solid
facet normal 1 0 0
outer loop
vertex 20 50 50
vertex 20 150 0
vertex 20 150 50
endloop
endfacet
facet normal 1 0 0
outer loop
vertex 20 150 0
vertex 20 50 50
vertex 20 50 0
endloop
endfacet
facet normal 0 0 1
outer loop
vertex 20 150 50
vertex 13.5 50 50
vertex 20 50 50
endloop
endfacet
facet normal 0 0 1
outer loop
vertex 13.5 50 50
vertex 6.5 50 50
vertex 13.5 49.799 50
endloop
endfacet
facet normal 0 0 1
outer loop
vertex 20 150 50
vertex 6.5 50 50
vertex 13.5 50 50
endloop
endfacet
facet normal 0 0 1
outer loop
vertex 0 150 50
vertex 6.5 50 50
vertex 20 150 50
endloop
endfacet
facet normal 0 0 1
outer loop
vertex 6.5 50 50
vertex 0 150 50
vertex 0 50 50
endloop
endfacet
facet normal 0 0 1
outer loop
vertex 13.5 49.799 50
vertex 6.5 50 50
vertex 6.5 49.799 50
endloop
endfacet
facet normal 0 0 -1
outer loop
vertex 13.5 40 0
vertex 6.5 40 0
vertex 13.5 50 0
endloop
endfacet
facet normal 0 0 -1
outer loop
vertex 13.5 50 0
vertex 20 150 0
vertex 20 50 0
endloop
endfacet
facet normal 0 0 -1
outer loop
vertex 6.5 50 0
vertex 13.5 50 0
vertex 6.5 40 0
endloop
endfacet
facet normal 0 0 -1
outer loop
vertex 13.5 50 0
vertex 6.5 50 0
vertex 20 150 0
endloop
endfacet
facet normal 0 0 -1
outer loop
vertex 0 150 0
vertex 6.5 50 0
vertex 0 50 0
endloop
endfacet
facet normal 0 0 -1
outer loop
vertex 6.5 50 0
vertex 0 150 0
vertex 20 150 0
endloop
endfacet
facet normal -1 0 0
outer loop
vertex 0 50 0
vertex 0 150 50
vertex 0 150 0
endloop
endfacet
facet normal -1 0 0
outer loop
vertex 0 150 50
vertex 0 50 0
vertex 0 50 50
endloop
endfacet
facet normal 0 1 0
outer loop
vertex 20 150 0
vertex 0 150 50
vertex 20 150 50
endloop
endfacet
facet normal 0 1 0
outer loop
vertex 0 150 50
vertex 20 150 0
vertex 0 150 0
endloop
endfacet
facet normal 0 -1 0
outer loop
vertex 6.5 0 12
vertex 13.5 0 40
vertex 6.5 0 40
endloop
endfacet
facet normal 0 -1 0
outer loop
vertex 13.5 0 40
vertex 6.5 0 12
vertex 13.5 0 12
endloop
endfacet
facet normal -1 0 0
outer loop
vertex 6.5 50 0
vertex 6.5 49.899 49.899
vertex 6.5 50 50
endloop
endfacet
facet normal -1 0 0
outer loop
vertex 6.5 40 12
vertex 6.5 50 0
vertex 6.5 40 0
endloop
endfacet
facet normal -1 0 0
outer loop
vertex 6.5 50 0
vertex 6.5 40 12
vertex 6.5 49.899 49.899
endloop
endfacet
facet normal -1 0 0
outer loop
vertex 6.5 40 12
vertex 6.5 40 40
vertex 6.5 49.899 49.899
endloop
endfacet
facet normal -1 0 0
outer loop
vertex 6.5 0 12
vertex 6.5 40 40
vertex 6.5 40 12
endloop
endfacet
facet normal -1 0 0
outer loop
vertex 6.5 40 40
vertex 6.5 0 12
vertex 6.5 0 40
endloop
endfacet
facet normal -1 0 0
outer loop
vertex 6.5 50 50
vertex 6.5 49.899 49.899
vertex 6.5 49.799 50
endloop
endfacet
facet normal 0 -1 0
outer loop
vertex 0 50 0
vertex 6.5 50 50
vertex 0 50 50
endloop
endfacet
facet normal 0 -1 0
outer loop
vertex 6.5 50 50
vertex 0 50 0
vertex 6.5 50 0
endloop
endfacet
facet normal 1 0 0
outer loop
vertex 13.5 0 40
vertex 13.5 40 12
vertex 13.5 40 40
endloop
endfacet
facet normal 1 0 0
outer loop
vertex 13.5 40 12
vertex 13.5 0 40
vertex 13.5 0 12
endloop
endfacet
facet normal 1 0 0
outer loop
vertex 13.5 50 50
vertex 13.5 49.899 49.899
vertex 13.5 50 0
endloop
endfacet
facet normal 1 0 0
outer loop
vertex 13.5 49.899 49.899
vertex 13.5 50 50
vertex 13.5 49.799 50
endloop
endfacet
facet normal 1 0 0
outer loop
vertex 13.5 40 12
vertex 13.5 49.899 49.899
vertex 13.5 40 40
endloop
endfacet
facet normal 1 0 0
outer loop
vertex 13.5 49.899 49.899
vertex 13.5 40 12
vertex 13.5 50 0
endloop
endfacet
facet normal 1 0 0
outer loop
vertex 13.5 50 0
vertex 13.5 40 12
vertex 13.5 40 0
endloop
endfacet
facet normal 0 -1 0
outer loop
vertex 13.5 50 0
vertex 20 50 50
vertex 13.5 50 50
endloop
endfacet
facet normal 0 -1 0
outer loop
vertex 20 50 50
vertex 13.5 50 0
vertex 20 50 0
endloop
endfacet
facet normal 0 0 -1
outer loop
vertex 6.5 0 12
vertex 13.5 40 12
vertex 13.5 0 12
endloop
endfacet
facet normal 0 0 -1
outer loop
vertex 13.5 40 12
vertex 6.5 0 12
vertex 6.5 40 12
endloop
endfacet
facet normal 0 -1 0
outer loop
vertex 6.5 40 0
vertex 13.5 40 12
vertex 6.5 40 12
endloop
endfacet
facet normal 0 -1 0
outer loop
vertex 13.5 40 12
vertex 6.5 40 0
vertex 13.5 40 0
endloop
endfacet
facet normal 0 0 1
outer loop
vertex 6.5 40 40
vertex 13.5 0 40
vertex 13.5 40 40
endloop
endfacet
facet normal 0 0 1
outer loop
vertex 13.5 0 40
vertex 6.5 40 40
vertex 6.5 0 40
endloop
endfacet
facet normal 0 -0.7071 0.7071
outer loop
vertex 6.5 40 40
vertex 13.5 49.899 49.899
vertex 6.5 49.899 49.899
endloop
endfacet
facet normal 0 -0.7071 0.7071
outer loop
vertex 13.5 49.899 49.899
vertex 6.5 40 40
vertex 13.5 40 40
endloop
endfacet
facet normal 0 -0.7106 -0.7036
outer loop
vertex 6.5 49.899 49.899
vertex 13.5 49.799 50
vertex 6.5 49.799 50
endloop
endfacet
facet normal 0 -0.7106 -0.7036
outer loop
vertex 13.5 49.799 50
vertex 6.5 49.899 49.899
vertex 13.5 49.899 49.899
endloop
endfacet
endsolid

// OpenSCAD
difference(){
    difference(){
    difference(){
    difference(){
    difference() {
    cube([20,150,50]);
    cube([6.5,50,50]);
                 }
    translate([13.5,0,0])
    cube([6.5,50,50]);
             }
   translate([6.5,0,0])
    cube([7,40,12]);
         }
    translate([6.5,0,40])
         cube([7,40,10]);
     }
     
   translate([6.5,40,40])
    rotate([45,0,0])    
     cube([7,14,55]);
     }
   
